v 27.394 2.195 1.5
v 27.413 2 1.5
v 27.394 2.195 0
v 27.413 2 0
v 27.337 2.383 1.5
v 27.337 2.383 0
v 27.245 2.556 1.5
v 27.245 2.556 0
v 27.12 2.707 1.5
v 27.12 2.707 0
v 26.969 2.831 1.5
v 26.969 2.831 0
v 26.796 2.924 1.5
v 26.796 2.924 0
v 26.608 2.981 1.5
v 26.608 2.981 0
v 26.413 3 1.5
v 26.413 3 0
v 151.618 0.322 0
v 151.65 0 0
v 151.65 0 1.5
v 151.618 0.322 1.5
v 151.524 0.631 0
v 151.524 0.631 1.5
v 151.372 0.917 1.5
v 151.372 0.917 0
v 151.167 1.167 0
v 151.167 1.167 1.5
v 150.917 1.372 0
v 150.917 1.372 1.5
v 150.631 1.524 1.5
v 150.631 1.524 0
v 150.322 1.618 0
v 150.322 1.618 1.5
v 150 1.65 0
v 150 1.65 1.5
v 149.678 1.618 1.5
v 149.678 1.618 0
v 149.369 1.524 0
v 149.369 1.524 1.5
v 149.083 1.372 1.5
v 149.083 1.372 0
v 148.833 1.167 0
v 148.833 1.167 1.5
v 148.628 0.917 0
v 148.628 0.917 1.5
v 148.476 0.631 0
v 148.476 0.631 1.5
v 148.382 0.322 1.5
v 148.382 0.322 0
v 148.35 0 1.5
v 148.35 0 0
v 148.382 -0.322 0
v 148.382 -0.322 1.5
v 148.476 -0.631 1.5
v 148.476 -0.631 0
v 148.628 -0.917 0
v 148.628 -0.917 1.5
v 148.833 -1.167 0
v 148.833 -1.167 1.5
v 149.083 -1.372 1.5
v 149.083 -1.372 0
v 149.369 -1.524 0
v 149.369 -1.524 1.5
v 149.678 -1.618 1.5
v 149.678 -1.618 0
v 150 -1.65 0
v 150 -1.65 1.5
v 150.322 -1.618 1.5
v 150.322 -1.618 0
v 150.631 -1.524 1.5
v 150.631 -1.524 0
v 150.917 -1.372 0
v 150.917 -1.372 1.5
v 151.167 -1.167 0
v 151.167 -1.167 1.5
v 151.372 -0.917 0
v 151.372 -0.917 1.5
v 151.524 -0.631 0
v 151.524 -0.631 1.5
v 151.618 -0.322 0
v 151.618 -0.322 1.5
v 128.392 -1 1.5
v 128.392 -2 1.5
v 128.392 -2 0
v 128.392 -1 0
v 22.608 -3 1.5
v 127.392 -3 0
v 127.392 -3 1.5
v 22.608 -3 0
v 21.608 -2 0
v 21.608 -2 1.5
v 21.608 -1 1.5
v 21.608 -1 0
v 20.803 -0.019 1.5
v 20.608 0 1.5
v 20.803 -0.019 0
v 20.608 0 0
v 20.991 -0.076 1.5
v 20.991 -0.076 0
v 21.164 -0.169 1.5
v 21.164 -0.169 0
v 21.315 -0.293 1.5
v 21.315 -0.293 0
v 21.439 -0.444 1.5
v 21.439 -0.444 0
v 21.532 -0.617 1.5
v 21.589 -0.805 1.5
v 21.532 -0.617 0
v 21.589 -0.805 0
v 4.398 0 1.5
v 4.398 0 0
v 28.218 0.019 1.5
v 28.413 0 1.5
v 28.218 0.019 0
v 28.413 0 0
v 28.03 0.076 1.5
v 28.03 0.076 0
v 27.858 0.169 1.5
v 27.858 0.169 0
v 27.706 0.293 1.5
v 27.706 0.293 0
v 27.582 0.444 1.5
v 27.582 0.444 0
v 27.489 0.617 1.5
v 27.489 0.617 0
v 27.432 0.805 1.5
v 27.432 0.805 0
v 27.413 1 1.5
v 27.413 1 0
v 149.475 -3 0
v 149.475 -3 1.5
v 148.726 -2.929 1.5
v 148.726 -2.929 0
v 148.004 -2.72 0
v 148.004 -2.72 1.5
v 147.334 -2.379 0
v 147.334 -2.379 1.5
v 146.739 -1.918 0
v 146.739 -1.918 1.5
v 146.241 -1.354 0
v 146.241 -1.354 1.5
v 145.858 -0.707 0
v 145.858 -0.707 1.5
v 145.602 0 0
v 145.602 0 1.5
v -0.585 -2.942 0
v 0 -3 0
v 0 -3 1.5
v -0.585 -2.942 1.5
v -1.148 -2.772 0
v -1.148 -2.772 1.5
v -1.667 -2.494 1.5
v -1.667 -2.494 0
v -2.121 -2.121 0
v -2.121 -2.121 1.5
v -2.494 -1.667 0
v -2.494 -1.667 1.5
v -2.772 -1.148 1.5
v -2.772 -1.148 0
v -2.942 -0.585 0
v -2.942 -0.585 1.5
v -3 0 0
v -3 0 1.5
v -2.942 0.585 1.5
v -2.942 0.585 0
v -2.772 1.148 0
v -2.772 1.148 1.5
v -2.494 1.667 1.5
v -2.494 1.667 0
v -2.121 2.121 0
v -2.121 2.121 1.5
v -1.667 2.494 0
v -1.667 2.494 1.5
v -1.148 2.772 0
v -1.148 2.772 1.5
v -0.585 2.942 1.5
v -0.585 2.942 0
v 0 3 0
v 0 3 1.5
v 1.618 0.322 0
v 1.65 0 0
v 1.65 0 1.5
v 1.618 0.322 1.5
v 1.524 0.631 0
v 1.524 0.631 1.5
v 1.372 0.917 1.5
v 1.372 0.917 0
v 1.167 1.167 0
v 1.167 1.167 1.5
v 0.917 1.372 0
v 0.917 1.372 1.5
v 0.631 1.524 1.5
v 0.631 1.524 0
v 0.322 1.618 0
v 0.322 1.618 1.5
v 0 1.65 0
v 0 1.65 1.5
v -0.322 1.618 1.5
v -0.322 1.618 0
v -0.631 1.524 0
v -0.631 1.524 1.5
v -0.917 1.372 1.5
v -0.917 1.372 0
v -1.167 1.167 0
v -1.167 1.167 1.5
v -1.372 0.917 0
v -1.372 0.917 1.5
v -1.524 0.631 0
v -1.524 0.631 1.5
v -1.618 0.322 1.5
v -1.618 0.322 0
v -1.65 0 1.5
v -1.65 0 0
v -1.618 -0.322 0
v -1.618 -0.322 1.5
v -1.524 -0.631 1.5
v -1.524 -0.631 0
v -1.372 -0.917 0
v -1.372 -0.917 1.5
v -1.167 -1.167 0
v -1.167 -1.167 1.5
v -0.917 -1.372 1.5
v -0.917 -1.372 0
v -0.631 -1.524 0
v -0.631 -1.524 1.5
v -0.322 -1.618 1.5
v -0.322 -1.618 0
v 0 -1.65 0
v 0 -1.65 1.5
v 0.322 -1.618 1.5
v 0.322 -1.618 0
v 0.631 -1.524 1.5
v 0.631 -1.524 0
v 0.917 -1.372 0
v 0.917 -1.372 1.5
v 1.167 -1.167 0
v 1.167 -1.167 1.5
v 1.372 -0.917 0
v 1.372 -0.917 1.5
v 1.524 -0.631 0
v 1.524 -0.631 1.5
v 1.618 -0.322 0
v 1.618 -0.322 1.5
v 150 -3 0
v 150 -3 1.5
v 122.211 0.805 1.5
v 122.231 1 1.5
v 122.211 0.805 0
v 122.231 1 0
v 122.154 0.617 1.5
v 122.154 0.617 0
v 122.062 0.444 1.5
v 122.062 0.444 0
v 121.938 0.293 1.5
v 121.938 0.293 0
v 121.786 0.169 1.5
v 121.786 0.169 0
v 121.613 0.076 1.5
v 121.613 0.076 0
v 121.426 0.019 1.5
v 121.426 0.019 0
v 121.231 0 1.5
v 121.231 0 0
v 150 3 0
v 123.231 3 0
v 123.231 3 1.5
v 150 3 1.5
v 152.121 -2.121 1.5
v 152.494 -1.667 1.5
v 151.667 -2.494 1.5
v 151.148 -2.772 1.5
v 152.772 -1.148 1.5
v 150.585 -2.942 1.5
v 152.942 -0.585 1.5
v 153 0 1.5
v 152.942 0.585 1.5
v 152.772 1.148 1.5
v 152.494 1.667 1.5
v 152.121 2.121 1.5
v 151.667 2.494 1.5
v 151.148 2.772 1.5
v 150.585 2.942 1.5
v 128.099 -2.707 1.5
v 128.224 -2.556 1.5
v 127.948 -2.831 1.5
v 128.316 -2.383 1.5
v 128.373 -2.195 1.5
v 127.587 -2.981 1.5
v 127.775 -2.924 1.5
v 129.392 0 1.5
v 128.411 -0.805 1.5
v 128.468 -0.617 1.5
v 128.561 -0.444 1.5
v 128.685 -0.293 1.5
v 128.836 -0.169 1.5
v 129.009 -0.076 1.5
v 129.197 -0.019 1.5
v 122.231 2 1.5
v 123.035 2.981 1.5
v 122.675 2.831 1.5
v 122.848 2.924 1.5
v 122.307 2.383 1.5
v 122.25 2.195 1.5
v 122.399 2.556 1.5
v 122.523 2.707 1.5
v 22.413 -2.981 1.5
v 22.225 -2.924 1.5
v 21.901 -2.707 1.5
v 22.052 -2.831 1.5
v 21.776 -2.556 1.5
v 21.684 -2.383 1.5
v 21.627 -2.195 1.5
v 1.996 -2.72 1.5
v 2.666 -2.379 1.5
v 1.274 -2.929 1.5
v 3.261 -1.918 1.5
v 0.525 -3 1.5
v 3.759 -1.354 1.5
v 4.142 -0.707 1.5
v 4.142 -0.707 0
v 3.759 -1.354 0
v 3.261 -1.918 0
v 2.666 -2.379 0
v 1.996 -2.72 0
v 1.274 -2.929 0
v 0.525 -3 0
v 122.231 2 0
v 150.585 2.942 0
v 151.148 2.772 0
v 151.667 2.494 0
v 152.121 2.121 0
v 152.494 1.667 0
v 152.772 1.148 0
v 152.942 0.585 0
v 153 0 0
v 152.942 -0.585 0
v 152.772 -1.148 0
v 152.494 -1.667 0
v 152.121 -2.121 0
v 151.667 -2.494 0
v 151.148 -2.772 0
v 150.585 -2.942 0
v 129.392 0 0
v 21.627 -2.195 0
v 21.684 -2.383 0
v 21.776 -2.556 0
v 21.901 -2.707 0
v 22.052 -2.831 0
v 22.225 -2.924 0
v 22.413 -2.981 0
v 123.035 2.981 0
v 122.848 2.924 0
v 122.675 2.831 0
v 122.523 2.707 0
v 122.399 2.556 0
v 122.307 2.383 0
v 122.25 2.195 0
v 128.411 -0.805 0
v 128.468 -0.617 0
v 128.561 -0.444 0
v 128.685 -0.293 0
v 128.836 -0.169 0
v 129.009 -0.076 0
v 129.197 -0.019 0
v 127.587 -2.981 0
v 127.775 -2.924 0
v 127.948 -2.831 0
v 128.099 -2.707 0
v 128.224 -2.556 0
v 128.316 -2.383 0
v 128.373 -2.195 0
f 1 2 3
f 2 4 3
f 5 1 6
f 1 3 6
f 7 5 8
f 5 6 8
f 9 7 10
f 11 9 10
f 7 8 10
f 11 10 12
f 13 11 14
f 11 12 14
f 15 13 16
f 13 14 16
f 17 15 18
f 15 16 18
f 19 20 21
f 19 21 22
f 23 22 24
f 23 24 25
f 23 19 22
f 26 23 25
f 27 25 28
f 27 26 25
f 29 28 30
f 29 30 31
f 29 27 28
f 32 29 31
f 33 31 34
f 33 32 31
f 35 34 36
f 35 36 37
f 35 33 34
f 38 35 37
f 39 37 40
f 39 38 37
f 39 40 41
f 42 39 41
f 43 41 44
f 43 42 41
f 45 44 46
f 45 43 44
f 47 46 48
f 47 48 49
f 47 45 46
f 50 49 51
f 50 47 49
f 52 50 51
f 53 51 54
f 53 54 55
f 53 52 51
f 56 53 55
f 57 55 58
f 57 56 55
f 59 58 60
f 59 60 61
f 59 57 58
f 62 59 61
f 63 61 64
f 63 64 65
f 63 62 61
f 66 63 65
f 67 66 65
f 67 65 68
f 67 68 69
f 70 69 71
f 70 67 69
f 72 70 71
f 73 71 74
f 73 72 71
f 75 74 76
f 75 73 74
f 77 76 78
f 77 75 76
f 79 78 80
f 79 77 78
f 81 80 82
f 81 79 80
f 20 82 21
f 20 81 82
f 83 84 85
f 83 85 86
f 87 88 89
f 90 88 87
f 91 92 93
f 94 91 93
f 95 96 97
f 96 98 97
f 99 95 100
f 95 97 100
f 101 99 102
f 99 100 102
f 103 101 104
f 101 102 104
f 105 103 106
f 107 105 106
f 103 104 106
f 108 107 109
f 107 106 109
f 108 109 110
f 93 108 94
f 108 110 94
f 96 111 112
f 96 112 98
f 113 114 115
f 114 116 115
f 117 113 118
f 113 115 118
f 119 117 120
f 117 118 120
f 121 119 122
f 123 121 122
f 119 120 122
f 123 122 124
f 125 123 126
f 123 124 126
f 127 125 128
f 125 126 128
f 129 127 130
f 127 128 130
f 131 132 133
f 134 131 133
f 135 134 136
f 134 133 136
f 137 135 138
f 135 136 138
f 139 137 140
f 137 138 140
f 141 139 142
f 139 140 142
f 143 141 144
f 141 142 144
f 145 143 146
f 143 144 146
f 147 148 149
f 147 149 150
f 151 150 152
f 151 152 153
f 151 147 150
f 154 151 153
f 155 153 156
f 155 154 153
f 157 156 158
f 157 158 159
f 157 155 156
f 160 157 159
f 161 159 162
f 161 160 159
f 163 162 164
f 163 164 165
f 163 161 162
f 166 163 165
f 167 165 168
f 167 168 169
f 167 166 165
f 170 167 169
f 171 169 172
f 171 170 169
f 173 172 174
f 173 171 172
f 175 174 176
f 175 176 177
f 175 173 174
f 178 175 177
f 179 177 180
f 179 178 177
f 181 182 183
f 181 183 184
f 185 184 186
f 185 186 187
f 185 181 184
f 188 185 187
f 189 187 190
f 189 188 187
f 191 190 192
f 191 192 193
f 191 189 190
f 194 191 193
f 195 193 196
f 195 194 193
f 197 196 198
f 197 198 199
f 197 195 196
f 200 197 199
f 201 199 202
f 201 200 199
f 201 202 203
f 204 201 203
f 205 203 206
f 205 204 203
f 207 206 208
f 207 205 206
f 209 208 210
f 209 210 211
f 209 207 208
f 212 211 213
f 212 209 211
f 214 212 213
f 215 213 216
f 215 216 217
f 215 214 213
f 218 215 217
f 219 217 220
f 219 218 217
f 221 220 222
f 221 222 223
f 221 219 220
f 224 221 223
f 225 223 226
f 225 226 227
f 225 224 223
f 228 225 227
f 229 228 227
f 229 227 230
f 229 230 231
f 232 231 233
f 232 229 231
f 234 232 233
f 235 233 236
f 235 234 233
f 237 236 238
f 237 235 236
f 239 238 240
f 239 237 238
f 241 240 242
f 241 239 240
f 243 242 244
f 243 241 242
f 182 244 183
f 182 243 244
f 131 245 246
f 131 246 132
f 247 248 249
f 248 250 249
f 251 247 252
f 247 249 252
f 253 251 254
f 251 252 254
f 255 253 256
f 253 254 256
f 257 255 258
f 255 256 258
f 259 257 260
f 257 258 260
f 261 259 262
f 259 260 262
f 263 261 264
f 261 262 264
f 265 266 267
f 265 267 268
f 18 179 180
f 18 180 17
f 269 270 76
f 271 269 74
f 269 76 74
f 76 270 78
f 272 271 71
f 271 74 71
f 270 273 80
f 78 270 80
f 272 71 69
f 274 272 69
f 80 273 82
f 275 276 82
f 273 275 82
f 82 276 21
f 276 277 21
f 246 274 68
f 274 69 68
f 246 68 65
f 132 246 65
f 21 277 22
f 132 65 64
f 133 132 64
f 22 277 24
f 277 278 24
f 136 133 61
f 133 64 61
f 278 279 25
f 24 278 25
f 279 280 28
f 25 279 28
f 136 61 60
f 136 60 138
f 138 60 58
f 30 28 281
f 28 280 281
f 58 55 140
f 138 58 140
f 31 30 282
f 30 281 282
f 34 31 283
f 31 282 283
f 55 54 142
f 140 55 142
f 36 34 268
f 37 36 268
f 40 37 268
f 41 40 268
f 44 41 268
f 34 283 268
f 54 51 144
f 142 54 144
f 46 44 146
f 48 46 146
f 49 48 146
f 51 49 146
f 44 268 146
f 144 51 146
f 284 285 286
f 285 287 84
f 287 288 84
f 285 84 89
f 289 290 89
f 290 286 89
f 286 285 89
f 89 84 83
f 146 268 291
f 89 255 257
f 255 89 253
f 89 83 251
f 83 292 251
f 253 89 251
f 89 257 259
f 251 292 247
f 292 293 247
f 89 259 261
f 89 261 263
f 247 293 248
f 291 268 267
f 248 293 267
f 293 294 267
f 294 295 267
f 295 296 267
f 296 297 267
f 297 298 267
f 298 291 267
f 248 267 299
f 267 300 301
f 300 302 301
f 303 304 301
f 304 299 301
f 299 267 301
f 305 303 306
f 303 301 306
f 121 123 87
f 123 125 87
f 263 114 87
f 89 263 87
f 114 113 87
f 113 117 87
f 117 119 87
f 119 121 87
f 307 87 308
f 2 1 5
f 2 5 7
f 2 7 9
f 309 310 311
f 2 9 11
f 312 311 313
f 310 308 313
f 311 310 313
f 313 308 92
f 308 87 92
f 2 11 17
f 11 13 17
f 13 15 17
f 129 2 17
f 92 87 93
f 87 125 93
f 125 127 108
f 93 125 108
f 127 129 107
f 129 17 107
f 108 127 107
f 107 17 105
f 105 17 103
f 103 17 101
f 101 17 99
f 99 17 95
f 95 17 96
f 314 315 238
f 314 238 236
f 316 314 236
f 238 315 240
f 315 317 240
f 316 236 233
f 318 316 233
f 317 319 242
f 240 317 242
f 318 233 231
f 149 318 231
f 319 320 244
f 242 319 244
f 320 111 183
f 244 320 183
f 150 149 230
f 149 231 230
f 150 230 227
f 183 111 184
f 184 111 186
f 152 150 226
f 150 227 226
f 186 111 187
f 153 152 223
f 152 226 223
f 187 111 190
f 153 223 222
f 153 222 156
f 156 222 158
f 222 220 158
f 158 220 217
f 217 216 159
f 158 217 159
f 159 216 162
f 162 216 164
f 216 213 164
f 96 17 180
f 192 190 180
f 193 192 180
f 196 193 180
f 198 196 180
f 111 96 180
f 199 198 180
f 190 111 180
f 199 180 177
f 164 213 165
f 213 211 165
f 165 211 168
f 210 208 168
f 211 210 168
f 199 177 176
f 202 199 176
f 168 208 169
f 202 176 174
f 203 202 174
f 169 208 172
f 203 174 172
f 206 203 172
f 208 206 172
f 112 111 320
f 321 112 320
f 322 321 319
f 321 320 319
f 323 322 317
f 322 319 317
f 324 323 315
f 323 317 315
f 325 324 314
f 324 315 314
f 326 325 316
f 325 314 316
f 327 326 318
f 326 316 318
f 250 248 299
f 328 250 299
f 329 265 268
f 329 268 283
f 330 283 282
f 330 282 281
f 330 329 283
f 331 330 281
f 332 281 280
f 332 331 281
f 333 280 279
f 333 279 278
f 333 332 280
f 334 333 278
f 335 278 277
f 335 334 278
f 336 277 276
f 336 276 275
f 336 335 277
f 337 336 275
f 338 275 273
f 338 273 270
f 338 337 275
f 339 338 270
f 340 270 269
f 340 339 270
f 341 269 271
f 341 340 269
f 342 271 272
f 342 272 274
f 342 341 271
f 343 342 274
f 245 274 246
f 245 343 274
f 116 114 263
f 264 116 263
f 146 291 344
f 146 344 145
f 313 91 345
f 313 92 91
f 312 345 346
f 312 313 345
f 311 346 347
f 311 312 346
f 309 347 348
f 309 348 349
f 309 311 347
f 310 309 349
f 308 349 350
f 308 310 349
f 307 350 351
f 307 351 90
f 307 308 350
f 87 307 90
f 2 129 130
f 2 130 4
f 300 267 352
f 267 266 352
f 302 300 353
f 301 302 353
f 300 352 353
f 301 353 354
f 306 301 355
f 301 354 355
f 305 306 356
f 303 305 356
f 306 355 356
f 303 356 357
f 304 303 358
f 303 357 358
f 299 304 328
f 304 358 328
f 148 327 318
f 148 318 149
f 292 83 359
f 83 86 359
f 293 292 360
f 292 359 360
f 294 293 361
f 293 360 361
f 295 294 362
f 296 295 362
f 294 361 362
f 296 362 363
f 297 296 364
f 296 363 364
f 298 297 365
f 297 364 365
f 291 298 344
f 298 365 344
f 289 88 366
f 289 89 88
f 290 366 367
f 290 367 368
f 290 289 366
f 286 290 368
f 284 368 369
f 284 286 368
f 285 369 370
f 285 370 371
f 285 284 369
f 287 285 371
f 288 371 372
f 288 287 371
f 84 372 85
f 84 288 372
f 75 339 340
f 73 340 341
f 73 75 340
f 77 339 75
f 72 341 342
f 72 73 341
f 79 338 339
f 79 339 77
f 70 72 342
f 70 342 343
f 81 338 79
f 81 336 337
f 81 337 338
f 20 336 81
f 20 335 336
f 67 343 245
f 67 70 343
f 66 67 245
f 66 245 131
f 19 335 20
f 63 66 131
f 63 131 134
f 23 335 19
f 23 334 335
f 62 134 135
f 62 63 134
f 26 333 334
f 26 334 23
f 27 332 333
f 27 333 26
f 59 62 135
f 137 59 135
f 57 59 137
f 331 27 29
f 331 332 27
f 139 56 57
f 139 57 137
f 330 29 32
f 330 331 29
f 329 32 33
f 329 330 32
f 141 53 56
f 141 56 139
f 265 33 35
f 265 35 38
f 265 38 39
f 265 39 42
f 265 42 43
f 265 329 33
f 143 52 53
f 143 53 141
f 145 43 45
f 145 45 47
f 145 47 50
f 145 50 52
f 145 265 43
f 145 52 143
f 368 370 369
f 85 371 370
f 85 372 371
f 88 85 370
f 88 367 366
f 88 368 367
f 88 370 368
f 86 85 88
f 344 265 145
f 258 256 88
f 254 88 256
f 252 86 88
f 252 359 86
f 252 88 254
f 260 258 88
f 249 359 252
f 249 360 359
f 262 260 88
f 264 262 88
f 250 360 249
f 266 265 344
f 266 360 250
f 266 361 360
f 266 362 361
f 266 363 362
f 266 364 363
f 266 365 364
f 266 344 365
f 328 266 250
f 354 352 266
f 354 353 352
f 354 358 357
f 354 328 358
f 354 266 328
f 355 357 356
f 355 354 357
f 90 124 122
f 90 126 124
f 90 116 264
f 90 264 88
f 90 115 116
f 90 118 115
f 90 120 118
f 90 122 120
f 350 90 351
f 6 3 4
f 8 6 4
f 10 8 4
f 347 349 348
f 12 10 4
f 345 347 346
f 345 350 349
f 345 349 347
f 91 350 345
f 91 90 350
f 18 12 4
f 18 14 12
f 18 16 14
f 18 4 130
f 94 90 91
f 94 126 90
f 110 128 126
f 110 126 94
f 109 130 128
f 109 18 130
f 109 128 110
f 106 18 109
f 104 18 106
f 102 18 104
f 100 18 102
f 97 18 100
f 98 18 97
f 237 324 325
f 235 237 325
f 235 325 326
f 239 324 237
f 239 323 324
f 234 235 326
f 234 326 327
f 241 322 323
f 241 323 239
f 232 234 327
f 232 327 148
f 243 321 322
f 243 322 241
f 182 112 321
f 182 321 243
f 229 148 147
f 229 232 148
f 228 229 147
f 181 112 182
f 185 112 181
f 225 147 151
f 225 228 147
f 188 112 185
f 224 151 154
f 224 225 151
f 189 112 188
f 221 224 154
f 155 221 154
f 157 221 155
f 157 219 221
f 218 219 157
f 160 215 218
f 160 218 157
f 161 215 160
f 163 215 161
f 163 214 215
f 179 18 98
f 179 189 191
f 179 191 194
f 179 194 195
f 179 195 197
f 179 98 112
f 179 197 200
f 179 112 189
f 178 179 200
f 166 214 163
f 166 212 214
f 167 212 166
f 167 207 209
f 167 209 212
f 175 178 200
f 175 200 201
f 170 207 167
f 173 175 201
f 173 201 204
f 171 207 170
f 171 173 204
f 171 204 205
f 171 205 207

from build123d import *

# Parameters (mm, degrees)
SKETCH_1_R          = 5.5
EXTRUDE_1_DEPTH     = 5
SCALE_1_SCALE       = 0.3
SKETCH_3_W          = 17.210108286
SKETCH_3_H          = 5.437935386
CUT_EXTRUDE_2_DEPTH = 20
FILLET_1_R          = 4
FILLET_2_R          = 1
SKETCH_4_W          = 94.817377104
SKETCH_4_H          = 9.548741528
CUT_EXTRUDE_3_DEPTH = 20
FILLET_3_R          = 1


with BuildPart() as part:
    # 草图1 → 凸台-拉伸1 (new body)
    with BuildSketch(Plane.XY):
        with BuildLine():
            Line((0, 10), (500, 10))
            ThreePointArc((500, 10), (510, 0), (500, -10))
            Line((500, -10), (0, -10))
            ThreePointArc((0, -10), (-10, 0), (0, 10))
        make_face()
        Circle(SKETCH_1_R, mode=Mode.SUBTRACT)
        with Locations((500, 0)):
            Circle(SKETCH_1_R, mode=Mode.SUBTRACT)
    extrude(amount=EXTRUDE_1_DEPTH)


with BuildPart() as part_1:
    # 缩放比例1: scaled about (0, 0, 0)
    add(part.part.scale(SCALE_1_SCALE))

    # 草图3 → 切除-拉伸2 (cut)
    with BuildSketch(Plane.XY.offset(1.5)):
        with Locations((13.002886653, -2.718967693)):
            Rectangle(SKETCH_3_W, SKETCH_3_H)
        with Locations((136.997113347, -2.718967693)):
            Rectangle(SKETCH_3_W, SKETCH_3_H)
    extrude(amount=-CUT_EXTRUDE_2_DEPTH, mode=Mode.SUBTRACT)

    # 圆角1
    # the kernel refuses this fillet: 4 mm, written as the material it takes off along each edge
    with BuildSketch(Plane(origin=(145.60216749, -3, 11.182458366), x_dir=(1, 0, 0), z_dir=(0, 0, -1))) as fillet_1_piece_1:
        with BuildLine():
            CenterArc((3.872983346, -4), FILLET_1_R, 90, 75.522487814)
            Line((0, -3), (-0.077459667, -2.98))
            ThreePointArc((-0.077459667, -2.98), (-0.08, -1.5), (-0.08, 0))
            Line((-0.08, 0), (0, 0.08))
            Line((0, 0.08), (3.872983346, 0.08))
            Line((3.872983346, 0.08), (3.872983346, 0))
        make_face()
    extrude(amount=20.864916731, mode=Mode.SUBTRACT)
    with BuildSketch(Plane(origin=(4.39783251, -3, 11.182458366), x_dir=(-1, 0, 0), z_dir=(0, 0, -1))) as fillet_1_piece_2:
        with BuildLine():
            CenterArc((3.872983346, 4), FILLET_1_R, 194.477512186, 75.522487814)
            Line((0, 3), (-0.077459667, 2.98))
            ThreePointArc((-0.077459667, 2.98), (-0.08, 1.5), (-0.08, 0))
            Line((-0.08, 0), (0, -0.08))
            Line((0, -0.08), (3.872983346, -0.08))
            Line((3.872983346, -0.08), (3.872983346, 0))
        make_face()
    extrude(amount=20.864916731, mode=Mode.SUBTRACT)

    # 圆角2
    fillet_2_edges = [part_1.edges().sort_by_distance(p)[0] for p in [
        (128.392059204, -3, 0.75),
        (21.607940796, -3, 0.75),
        (21.607940796, 0, 0.75),
        (128.392059204, 0, 0.75),
    ]]
    fillet(fillet_2_edges, radius=FILLET_2_R)

    # 草图4 → 切除-拉伸3 (cut)
    with BuildSketch(Plane.XY.offset(1.5)):
        with Locations((74.821866685, 4.774370764)):
            Rectangle(SKETCH_4_W, SKETCH_4_H)
    extrude(amount=-CUT_EXTRUDE_3_DEPTH, mode=Mode.SUBTRACT)

    # 圆角3
    fillet_3_edges = [part_1.edges().sort_by_distance(p)[0] for p in [
        (122.230555237, 3, 0.75),
        (27.413178133, 3, 0.75),
        (122.230555237, 0, 0.75),
        (27.413178133, 0, 0.75),
    ]]
    fillet(fillet_3_edges, radius=FILLET_3_R)


solid = part_1.part
